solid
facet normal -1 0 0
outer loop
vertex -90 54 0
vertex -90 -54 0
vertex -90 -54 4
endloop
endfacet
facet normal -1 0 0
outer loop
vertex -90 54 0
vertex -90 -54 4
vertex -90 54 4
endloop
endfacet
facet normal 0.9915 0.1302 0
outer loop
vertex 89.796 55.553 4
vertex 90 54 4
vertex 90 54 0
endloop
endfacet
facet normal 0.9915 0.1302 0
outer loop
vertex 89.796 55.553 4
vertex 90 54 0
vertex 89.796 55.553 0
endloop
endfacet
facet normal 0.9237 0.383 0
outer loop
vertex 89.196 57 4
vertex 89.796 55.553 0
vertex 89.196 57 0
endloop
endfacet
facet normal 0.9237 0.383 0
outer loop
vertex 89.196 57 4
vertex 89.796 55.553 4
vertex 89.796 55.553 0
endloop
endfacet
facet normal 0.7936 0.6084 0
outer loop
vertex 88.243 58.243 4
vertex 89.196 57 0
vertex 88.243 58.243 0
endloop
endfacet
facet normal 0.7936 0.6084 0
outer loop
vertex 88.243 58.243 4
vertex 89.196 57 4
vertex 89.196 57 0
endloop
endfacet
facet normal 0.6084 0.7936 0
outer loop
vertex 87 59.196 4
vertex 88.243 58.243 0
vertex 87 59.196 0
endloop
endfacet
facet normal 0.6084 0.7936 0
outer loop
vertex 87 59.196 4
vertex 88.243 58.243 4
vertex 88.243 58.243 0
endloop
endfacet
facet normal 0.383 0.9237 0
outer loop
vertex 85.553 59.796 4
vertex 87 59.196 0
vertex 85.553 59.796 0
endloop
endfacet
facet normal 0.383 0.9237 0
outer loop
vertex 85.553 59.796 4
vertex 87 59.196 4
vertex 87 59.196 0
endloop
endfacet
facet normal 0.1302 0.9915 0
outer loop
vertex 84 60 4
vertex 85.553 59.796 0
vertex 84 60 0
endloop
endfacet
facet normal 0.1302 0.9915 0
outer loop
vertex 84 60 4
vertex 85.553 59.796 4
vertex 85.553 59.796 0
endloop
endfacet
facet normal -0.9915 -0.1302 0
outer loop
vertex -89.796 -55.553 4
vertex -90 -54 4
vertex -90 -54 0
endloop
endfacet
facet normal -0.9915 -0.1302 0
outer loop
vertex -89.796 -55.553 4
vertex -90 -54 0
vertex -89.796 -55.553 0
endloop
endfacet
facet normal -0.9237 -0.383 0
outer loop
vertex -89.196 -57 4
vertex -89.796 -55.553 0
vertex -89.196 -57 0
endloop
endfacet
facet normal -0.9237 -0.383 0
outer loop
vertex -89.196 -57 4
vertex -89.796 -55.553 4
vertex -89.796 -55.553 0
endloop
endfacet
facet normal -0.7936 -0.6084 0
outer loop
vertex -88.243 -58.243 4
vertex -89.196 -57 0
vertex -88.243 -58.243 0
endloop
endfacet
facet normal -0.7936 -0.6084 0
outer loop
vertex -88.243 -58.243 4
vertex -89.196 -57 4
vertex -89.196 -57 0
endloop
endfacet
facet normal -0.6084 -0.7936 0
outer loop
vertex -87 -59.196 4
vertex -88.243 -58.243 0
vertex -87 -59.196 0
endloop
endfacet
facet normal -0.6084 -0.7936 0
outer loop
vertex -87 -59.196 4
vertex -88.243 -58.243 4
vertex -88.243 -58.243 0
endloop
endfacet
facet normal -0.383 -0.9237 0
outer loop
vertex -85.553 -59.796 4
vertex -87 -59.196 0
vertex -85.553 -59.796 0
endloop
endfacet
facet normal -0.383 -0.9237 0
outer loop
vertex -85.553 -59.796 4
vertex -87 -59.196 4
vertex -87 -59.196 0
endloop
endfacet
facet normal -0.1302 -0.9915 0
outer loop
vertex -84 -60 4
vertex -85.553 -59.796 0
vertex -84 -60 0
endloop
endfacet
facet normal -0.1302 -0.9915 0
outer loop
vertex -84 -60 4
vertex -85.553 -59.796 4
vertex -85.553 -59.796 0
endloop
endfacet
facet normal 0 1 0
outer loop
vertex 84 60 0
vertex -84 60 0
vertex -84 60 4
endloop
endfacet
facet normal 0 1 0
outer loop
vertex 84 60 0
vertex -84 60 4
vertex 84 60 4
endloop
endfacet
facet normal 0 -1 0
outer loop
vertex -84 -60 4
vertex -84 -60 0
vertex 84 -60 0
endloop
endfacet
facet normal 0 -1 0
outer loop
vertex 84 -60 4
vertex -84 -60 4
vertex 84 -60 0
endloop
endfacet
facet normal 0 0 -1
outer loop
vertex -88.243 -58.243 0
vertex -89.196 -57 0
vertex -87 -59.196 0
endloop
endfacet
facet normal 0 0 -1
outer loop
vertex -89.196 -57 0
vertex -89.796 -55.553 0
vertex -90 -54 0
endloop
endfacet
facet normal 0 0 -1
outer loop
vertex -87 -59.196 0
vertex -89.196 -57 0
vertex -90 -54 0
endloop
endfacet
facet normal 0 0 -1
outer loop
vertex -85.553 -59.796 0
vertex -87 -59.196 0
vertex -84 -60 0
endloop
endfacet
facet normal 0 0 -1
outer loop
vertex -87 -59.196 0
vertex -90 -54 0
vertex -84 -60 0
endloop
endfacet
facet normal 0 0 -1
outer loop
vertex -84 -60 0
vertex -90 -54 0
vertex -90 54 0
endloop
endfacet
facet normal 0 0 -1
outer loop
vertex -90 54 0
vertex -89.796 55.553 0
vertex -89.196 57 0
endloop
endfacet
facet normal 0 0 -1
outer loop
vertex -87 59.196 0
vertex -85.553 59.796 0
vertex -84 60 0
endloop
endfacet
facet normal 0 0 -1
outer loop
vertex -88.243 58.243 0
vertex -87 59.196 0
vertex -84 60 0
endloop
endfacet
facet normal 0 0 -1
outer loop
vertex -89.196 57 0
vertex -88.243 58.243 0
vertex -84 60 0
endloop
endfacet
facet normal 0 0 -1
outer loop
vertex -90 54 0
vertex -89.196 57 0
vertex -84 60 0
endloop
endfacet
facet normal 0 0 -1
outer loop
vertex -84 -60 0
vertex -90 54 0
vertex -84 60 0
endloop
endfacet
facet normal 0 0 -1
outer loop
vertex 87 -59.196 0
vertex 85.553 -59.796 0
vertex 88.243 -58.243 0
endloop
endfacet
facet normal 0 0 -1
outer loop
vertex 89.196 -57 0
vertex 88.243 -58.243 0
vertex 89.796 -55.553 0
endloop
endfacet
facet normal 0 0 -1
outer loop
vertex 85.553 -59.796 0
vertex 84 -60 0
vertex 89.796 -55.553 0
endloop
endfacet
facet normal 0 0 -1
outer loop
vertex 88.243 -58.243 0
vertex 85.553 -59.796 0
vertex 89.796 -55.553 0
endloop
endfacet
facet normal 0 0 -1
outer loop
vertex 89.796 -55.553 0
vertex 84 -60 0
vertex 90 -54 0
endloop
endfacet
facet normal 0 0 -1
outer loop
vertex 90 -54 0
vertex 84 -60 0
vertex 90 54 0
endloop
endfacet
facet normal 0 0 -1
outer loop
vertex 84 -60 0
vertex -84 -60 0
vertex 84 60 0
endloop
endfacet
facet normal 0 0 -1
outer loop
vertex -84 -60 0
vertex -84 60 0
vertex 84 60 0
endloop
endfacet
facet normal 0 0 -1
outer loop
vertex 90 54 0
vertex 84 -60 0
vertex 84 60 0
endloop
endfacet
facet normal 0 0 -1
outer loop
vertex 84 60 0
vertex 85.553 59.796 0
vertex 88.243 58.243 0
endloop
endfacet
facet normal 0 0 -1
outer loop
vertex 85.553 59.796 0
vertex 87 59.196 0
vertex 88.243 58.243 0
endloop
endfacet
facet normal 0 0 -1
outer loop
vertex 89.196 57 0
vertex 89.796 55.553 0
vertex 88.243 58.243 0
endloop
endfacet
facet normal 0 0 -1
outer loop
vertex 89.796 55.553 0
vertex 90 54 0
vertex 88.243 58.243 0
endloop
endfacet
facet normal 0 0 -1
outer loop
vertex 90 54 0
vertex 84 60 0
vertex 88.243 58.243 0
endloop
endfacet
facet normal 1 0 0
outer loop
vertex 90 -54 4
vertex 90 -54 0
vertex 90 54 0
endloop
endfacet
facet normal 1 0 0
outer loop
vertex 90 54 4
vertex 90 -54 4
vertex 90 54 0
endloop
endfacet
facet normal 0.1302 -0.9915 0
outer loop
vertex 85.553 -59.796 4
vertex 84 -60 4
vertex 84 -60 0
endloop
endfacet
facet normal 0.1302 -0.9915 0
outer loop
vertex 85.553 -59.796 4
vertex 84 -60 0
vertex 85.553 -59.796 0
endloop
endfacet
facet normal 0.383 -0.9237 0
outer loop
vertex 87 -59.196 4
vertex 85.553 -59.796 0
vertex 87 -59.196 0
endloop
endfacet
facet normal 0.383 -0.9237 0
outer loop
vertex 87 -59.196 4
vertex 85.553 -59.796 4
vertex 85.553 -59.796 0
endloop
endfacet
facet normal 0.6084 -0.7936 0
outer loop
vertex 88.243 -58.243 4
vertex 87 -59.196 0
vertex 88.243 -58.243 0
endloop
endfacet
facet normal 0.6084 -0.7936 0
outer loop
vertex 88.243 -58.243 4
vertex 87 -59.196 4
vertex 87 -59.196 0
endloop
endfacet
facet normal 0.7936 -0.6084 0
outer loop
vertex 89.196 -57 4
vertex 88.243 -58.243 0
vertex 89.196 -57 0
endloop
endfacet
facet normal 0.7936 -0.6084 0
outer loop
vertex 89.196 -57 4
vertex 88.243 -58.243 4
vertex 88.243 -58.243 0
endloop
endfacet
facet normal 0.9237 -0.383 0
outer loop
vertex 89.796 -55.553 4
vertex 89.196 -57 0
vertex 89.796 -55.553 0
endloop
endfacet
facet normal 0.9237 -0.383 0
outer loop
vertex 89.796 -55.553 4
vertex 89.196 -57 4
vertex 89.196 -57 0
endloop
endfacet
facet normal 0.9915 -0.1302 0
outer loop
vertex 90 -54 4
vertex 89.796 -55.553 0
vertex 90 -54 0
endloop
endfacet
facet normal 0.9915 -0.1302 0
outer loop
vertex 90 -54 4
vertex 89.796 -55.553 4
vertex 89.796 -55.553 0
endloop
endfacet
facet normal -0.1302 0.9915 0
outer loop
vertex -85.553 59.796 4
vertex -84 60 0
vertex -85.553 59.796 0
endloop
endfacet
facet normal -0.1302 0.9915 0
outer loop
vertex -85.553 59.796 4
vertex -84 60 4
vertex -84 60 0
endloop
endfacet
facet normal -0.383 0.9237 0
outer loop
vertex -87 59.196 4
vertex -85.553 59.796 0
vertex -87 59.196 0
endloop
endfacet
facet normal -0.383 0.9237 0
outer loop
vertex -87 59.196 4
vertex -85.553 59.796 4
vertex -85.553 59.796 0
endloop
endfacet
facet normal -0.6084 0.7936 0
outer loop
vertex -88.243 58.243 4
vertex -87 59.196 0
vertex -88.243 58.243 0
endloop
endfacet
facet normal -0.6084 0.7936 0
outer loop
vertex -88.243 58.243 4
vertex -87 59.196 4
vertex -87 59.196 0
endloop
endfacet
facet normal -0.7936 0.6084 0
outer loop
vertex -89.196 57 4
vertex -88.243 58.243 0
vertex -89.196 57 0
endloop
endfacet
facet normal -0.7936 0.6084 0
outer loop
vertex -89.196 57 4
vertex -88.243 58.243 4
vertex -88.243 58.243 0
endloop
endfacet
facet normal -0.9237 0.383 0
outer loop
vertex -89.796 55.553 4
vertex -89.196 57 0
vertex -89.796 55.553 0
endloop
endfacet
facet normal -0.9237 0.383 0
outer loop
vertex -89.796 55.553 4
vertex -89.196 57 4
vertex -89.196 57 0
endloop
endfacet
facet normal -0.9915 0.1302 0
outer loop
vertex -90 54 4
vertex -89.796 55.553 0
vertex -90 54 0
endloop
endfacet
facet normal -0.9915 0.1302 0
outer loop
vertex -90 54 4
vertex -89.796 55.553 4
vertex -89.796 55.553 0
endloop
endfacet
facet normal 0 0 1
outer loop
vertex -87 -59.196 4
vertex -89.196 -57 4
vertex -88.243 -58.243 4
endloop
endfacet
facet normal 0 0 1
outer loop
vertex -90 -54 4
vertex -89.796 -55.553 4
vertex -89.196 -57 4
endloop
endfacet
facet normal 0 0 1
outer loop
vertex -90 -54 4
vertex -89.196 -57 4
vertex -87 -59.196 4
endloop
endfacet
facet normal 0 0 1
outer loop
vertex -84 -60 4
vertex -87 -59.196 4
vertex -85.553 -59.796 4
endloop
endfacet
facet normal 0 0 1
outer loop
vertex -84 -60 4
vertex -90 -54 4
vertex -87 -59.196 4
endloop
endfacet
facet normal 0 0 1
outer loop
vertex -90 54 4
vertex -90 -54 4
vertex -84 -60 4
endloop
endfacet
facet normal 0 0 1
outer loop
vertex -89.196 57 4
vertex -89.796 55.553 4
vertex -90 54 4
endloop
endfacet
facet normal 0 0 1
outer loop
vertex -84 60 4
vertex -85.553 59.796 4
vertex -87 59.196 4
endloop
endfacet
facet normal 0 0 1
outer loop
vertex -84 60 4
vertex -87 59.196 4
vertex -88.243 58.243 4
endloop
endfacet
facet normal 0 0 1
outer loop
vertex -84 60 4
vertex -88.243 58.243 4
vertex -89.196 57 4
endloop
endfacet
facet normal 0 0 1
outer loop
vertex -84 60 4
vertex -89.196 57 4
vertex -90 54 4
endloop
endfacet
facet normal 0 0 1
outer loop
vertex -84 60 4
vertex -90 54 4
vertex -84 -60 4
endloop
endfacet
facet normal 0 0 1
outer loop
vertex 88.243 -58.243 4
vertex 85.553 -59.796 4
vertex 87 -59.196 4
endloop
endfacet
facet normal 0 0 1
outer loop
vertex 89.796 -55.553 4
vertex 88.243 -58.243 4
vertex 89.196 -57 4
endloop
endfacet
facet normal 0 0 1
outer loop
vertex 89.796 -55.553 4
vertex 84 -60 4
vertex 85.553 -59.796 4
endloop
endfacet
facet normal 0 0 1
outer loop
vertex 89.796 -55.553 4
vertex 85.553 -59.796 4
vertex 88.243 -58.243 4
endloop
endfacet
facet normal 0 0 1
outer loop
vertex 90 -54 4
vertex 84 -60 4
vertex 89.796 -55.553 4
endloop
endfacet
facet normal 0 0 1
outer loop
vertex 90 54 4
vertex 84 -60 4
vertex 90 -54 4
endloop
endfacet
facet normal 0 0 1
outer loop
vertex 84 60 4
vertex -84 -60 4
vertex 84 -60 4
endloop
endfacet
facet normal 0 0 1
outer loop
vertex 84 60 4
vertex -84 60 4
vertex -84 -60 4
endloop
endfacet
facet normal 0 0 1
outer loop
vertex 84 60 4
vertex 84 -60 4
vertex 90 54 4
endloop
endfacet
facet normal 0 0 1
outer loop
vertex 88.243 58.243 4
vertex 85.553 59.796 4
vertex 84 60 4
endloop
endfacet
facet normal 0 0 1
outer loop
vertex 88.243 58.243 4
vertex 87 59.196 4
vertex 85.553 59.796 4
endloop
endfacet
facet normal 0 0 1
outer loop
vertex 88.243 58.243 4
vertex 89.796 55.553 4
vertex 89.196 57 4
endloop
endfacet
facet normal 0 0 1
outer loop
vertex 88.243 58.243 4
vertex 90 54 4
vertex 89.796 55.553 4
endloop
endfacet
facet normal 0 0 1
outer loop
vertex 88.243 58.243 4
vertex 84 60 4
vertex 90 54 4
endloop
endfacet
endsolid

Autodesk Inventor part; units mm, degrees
ref_plane "YZ Plane" through (0, 0, 0) normal (1, 0, 0) x (0, 1, 0)
ref_plane "XZ Plane" through (0, 0, 0) normal (0, 1, 0) x (-1, 0, 0)
ref_plane "XY Plane" through (0, 0, 0) normal (0, 0, 1) x (1, 0, 0)
sketch3d "3D Sketch1"
sketch "Sketch1" plane through (0, 0, 0) normal (0, 0, 1) x (1, 0, 0)
  line L0 (-48, 60) -> (48, 60)
  line L1 (48, 60) -> (48, -60) construction
  line L2 (48, -60) -> (-48, -60)
  line L3 (-48, -60) -> (-48, 60) construction
  line L4 (-48, 60) -> (48, -60) construction
  line L5 (48, 60) -> (-48, -60) construction
  line L6 (48, -60) -> (90, -60)
  line L7 (90, -60) -> (90, 60)
  line L8 (90, 60) -> (48, 60)
  line L9 (-48, -60) -> (-90, -60)
  line L10 (-90, -60) -> (-90, 60)
  line L11 (-90, 60) -> (-48, 60)
  circle A0 centre (70, -45) radius 8.5
  circle A1 centre (70, 45) radius 8.5
  circle A2 centre (-70, -45) radius 8.5
  circle A3 centre (-70, 45) radius 8.5
  line L12 (0, -60) -> (0, 60) construction
  line L13 (90, 0) -> (-90, 0) construction
  point P0 (0, 0)
  dimension "d30" = 120
  dimension "d34" = 180
  dimension "d35" = 17
  dimension "d36" = 20
  dimension "d37" = 15
extrude "Plate1" add sketch "Sketch1" along normal blind 4 contours L0 L8 L7 L6 L2 L9 L10 L11 | A0 | A1 | A2 | A3
fillet "Corner Round1" radius 6 4 edges at (90, 60, 2) (-90, 60, 2) (-90, -60, 2) (90, -60, 2)
equation "\"d6\" = Thickness"
equation "\"BendReliefWidth\" = Thickness"
equation "\"BendReliefDepth\" = 0.5 * Thickness"
equation "\"CornerReliefSize\" = 4 * Thickness"
equation "\"MinimumRemnant\" = 2 * Thickness"
equation "\"TransitionRadius\" = BendRadius"
equation "\"JacobiRadiusSize\" = BendRadius"
equation "\"GapSize\" = Thickness"
equation "\"Thickness\" = 4"
equation "\"BendRadius\" = 6"
properties part number "MSC 907 BASE FRAME TRANSVERSE" material "Stainless Steel"
